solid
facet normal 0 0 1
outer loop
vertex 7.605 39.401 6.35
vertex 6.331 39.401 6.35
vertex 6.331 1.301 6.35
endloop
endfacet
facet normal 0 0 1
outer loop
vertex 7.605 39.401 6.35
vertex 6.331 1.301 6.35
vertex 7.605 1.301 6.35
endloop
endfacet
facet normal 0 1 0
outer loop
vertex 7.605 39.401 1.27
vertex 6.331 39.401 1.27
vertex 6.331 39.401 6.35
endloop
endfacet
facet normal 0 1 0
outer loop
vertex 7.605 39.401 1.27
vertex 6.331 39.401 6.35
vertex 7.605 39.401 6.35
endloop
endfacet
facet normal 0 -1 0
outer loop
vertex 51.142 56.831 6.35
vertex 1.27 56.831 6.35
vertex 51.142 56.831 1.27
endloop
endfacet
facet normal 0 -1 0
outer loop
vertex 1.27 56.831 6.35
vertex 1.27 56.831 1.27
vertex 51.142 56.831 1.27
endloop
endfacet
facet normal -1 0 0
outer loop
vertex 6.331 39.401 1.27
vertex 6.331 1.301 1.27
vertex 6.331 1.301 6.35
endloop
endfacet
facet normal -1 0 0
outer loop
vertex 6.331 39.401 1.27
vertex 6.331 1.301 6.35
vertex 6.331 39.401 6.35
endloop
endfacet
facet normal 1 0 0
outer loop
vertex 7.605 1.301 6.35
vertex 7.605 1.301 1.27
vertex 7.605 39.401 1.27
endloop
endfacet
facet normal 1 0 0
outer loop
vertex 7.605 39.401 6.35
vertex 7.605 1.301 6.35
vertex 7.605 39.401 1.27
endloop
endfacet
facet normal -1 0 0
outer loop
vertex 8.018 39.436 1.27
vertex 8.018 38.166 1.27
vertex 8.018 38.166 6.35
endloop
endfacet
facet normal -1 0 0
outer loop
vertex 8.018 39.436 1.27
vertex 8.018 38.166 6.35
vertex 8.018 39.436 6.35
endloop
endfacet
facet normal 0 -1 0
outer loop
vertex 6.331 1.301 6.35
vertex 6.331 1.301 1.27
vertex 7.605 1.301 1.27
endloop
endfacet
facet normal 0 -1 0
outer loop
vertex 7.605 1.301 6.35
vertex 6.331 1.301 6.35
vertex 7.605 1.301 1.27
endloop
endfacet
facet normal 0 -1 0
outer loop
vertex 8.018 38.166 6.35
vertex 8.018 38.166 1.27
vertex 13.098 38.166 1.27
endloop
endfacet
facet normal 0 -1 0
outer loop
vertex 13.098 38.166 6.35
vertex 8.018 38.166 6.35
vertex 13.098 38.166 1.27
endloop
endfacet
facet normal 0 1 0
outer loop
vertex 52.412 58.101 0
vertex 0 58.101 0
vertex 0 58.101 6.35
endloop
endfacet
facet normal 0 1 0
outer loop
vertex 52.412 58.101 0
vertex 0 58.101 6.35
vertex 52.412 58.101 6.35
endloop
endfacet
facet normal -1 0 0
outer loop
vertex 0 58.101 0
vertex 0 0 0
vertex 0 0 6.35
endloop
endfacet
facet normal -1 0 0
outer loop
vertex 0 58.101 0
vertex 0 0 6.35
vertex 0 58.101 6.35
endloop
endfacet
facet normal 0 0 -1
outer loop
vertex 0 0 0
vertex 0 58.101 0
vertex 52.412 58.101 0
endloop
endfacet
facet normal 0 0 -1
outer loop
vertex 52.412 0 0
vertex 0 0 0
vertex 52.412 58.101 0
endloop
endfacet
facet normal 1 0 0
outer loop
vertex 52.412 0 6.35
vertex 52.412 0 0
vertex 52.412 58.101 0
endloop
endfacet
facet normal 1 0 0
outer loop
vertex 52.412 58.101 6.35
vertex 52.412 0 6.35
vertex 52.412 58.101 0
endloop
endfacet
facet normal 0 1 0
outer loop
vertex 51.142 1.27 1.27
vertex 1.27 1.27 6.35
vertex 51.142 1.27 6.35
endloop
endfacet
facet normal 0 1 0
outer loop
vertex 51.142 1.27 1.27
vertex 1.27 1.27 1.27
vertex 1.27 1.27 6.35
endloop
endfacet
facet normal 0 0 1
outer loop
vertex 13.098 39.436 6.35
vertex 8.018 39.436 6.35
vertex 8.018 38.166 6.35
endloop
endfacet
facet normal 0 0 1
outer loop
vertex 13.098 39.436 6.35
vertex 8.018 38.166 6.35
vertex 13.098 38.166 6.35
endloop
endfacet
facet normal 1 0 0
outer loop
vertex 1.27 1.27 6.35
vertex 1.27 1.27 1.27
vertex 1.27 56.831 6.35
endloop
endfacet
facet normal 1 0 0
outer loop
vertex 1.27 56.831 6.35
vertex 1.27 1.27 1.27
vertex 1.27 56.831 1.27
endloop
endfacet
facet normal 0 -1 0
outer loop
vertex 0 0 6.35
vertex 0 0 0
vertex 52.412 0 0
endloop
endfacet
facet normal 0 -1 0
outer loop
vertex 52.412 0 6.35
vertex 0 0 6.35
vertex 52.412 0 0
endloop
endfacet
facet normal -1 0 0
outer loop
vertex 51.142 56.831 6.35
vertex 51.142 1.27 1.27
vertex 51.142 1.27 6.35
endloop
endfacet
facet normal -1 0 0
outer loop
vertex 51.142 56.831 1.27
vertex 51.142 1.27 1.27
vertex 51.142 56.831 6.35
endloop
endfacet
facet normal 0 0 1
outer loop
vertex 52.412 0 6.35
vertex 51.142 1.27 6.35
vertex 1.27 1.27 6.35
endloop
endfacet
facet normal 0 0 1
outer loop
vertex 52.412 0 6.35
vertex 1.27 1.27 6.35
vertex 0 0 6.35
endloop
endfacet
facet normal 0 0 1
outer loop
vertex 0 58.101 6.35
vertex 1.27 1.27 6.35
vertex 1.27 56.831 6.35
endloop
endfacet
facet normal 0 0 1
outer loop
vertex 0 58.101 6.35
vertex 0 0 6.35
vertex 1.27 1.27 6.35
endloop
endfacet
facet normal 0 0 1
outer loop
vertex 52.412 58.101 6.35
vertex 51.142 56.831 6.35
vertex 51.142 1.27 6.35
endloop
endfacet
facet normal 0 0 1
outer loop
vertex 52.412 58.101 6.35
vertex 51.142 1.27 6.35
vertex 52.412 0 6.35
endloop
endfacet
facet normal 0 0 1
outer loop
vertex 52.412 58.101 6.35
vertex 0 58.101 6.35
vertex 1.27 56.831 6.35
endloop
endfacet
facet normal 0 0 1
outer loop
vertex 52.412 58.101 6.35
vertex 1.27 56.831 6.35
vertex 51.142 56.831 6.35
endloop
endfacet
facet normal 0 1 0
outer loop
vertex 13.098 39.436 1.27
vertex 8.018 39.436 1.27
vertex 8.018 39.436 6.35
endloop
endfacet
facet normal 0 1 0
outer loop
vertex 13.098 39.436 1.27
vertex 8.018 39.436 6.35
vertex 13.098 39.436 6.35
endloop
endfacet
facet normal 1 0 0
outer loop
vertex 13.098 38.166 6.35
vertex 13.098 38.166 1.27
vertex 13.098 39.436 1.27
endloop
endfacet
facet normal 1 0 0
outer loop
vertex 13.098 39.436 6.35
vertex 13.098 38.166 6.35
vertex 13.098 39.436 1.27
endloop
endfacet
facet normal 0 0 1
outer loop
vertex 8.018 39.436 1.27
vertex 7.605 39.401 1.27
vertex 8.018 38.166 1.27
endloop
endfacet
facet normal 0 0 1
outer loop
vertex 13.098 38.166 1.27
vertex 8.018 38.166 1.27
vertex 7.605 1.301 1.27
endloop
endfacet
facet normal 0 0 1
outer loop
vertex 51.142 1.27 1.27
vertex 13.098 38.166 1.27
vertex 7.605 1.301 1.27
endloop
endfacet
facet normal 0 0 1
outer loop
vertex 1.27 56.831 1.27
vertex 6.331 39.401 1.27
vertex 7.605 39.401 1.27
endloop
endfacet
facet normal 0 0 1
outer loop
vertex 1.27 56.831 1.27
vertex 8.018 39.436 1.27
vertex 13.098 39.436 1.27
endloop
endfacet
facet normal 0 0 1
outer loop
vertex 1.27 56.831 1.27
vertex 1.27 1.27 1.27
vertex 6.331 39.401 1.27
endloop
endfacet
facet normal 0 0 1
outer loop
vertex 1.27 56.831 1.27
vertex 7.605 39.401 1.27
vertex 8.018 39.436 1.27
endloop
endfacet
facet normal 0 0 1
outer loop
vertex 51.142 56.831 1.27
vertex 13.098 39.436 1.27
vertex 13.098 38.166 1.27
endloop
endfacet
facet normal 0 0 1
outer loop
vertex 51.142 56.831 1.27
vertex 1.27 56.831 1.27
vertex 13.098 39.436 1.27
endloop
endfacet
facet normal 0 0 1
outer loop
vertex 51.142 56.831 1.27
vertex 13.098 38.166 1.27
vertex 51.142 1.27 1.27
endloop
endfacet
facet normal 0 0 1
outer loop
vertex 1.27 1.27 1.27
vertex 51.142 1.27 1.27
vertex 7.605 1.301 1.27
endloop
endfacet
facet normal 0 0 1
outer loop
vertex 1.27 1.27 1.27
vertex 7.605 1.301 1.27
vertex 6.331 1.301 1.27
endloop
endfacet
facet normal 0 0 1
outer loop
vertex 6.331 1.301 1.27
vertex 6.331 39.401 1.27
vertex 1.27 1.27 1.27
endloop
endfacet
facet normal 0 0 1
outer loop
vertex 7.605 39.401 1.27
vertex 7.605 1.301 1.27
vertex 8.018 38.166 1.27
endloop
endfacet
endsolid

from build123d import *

# Parameters (mm, degrees)
F0_W     = 52.411996
F0_H     = 58.101058
F1_DEPTH = 6.35
F2_T     = -1.27
F3_W     = 1.273277
F3_H     = 38.1
F4_DEPTH = 6.35
F5_W     = 5.08
F5_H     = 1.27
F6_DEPTH = 6.35


with BuildPart() as f1:
    # F0 (on Top) → F1 (new body)
    with BuildSketch(Plane.XY):
        with Locations((26.205998, 29.050529)):
            Rectangle(F0_W, F0_H)
    extrude(amount=F1_DEPTH)

    # F2
    f2_openings = [f1.faces().sort_by_distance(p)[0] for p in [
        (26.205998, 29.050529, 6.35),
    ]]
    offset(amount=F2_T, openings=f2_openings)

    # F3 (on Top) → F4 (join)
    with BuildSketch(Plane.XY):
        with Locations((6.968005, 20.351489)):
            Rectangle(F3_W, F3_H)
    extrude(amount=F4_DEPTH)

    # F5 (on Top) → F6 (join)
    with BuildSketch(Plane.XY):
        with Locations((10.558338, 38.800815)):
            Rectangle(F5_W, F5_H)
    extrude(amount=F6_DEPTH)


solid = f1.part
